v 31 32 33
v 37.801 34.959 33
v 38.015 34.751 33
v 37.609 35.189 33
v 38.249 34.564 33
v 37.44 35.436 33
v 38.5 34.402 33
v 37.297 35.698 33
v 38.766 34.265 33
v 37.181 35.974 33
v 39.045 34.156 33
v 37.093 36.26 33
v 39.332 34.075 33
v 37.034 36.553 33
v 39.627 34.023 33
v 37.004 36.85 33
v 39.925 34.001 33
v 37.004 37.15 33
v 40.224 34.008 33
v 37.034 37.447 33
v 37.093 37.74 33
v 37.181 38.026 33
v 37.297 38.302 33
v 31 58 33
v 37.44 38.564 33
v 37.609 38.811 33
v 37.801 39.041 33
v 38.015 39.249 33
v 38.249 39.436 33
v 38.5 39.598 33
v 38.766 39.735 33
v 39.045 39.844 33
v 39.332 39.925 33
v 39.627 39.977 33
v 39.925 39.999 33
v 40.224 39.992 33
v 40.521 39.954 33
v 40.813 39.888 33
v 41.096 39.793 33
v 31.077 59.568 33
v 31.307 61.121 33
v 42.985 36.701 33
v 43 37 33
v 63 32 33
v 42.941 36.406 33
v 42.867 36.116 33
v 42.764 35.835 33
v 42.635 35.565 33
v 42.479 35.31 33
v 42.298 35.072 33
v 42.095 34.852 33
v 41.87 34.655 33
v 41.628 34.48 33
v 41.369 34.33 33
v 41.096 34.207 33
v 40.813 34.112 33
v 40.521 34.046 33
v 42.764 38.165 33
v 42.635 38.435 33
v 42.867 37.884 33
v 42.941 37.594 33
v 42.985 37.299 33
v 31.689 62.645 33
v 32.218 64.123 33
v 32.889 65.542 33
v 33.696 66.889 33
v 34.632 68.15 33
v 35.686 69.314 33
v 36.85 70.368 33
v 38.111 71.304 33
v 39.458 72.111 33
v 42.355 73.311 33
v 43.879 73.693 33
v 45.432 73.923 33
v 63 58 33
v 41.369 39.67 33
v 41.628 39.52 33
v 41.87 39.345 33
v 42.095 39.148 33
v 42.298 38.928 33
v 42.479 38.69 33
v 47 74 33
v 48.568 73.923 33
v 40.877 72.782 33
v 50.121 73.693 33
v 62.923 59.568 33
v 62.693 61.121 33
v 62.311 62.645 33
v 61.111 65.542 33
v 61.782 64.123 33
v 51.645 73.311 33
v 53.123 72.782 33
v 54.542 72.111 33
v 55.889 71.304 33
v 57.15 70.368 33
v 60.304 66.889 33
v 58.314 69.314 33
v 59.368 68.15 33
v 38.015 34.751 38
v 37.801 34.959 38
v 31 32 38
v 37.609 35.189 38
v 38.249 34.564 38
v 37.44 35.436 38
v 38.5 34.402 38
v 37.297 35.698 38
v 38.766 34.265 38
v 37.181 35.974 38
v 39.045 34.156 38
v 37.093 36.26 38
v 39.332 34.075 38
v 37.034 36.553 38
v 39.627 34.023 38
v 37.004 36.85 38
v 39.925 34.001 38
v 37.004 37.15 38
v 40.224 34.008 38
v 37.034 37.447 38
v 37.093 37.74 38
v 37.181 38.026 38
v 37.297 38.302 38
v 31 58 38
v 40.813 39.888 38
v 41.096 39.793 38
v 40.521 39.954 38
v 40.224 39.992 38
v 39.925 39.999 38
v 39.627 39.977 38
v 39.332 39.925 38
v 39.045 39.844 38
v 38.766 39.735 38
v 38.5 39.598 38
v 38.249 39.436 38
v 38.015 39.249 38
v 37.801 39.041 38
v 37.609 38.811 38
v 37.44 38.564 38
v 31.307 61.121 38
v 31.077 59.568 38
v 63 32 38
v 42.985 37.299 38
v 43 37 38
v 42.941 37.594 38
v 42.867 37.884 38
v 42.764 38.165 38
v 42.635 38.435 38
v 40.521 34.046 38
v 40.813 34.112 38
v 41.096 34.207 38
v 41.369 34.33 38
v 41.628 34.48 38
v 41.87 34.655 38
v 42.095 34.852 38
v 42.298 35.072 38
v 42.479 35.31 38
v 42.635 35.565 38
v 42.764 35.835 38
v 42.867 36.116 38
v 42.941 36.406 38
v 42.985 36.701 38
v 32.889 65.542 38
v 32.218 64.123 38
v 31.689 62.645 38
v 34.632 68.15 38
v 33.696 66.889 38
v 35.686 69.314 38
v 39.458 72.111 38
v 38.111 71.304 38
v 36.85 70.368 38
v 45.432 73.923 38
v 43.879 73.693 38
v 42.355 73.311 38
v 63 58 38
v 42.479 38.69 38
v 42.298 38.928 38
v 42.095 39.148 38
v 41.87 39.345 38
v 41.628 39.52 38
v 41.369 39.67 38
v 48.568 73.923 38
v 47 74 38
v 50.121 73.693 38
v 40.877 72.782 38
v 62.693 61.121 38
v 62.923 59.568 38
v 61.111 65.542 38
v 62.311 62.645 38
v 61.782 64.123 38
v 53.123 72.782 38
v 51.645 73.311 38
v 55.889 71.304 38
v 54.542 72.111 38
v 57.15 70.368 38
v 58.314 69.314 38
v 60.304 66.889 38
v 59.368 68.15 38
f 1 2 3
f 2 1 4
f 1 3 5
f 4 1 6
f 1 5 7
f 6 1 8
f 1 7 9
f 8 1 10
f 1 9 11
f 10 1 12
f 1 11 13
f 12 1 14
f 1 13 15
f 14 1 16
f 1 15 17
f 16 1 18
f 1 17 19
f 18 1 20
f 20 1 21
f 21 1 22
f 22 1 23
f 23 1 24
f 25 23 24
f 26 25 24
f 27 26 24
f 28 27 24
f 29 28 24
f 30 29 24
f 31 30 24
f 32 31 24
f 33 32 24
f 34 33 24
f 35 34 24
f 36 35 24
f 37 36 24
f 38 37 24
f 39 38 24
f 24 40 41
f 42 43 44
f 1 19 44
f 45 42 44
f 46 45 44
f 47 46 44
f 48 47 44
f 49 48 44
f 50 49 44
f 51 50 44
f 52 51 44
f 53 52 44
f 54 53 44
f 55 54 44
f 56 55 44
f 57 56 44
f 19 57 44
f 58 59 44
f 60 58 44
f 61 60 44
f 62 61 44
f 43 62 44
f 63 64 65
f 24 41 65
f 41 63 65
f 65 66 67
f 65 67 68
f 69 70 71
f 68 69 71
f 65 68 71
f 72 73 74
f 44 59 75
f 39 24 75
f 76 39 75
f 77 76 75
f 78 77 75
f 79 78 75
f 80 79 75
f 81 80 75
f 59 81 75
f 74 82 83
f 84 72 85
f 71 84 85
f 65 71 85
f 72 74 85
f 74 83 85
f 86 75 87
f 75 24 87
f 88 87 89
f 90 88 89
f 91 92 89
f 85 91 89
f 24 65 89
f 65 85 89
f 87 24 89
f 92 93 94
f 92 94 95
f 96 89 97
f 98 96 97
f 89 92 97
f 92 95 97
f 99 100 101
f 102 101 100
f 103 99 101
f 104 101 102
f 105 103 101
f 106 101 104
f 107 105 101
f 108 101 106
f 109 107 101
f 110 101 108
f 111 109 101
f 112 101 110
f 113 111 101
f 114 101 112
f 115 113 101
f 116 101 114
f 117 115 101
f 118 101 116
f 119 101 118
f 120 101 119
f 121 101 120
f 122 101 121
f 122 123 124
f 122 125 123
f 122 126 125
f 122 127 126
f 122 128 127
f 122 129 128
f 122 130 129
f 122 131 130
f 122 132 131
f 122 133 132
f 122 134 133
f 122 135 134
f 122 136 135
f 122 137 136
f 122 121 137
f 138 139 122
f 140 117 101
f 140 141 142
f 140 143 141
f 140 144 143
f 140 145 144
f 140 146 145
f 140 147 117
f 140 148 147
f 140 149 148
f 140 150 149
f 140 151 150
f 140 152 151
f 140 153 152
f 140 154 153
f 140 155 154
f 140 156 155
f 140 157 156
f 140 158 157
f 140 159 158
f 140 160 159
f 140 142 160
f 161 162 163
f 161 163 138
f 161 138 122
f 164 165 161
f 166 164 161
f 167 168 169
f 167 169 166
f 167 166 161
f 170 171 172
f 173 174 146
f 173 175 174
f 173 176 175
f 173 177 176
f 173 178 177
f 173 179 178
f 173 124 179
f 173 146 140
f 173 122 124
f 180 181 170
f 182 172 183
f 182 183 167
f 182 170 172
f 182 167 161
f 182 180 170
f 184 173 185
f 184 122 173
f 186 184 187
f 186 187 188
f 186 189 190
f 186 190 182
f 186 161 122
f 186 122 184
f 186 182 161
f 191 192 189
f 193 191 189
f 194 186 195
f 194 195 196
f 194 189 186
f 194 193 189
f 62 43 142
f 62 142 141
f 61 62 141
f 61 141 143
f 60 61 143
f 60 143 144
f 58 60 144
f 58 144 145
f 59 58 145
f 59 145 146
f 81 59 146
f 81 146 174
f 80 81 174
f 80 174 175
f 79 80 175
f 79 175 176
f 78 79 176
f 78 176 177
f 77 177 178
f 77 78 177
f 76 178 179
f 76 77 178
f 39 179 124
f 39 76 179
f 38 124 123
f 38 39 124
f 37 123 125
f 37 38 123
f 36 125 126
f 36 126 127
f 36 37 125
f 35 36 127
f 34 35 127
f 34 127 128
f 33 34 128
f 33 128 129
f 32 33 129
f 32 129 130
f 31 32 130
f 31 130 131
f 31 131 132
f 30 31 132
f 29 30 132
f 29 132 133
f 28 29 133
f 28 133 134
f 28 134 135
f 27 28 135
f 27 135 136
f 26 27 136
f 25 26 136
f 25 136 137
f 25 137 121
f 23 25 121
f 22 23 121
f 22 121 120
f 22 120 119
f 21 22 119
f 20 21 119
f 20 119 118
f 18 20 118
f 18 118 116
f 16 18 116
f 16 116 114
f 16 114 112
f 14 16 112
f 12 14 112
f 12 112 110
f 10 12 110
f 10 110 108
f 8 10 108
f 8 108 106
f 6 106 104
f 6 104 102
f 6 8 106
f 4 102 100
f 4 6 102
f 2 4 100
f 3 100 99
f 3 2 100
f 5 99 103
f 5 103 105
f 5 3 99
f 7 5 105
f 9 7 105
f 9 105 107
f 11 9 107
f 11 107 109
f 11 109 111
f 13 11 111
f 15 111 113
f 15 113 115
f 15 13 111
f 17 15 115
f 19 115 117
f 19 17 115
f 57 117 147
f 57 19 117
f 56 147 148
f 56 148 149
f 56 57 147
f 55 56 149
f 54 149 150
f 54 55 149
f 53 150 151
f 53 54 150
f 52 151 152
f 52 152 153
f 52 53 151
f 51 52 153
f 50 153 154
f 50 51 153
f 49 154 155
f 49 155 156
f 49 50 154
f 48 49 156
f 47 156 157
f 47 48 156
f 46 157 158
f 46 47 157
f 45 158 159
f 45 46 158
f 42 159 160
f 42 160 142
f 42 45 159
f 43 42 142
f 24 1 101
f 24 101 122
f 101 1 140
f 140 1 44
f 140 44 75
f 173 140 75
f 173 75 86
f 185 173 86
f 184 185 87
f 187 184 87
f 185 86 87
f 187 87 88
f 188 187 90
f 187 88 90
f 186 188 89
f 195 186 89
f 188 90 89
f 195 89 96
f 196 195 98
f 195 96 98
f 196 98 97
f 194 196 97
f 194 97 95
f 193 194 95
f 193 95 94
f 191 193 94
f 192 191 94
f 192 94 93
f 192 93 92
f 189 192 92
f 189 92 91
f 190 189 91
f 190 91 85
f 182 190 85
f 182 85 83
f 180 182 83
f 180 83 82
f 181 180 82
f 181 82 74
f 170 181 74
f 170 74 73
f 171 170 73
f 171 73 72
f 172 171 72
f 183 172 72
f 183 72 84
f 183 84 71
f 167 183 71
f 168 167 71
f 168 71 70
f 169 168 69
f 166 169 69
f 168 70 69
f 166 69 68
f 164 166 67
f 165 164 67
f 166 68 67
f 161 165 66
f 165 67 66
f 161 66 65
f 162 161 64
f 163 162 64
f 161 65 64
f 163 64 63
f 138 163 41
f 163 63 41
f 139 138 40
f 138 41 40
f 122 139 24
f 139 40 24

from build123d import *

# Parameters (mm, degrees)
CYLINDER009_R     = 3
CYLINDER009_DEPTH = 10
BOX003_W          = 32
BOX003_H          = 26
BOX003_DEPTH      = 5
CYLINDER008_R     = 16
CYLINDER008_DEPTH = 5


with BuildPart() as cilindro002:
    # Cylinder009 → Cylinder009 (new body)
    with BuildSketch(Plane(origin=(40, 37, 28), x_dir=(1, 0, 0), z_dir=(0, 0, 1))):
        Circle(CYLINDER009_R)
    extrude(amount=CYLINDER009_DEPTH)


with BuildPart() as cubo002:
    # Box003 → Box003 (new body)
    with BuildSketch(Plane(origin=(3, -8, 30), x_dir=(1, 0, 0), z_dir=(0, 0, 1))):
        with Locations((16, 13)):
            Rectangle(BOX003_W, BOX003_H)
    extrude(amount=BOX003_DEPTH)


with BuildPart() as tapa:
    # Cylinder008 → Cylinder008 (new body)
    with BuildSketch(Plane(origin=(19, 18, 30), x_dir=(1, 0, 0), z_dir=(0, 0, 1))):
        Circle(CYLINDER008_R)
    extrude(amount=CYLINDER008_DEPTH)

    # Fusion003: union Cubo002
    add(cubo002.part)


with BuildPart() as tapa_1:
    # Fusion003 placement: moved
    add(tapa.part.moved(Location((28, 40, 3))))

    # Cut010: cut Cilindro002
    add(cilindro002.part, mode=Mode.SUBTRACT)


solid = tapa_1.part
